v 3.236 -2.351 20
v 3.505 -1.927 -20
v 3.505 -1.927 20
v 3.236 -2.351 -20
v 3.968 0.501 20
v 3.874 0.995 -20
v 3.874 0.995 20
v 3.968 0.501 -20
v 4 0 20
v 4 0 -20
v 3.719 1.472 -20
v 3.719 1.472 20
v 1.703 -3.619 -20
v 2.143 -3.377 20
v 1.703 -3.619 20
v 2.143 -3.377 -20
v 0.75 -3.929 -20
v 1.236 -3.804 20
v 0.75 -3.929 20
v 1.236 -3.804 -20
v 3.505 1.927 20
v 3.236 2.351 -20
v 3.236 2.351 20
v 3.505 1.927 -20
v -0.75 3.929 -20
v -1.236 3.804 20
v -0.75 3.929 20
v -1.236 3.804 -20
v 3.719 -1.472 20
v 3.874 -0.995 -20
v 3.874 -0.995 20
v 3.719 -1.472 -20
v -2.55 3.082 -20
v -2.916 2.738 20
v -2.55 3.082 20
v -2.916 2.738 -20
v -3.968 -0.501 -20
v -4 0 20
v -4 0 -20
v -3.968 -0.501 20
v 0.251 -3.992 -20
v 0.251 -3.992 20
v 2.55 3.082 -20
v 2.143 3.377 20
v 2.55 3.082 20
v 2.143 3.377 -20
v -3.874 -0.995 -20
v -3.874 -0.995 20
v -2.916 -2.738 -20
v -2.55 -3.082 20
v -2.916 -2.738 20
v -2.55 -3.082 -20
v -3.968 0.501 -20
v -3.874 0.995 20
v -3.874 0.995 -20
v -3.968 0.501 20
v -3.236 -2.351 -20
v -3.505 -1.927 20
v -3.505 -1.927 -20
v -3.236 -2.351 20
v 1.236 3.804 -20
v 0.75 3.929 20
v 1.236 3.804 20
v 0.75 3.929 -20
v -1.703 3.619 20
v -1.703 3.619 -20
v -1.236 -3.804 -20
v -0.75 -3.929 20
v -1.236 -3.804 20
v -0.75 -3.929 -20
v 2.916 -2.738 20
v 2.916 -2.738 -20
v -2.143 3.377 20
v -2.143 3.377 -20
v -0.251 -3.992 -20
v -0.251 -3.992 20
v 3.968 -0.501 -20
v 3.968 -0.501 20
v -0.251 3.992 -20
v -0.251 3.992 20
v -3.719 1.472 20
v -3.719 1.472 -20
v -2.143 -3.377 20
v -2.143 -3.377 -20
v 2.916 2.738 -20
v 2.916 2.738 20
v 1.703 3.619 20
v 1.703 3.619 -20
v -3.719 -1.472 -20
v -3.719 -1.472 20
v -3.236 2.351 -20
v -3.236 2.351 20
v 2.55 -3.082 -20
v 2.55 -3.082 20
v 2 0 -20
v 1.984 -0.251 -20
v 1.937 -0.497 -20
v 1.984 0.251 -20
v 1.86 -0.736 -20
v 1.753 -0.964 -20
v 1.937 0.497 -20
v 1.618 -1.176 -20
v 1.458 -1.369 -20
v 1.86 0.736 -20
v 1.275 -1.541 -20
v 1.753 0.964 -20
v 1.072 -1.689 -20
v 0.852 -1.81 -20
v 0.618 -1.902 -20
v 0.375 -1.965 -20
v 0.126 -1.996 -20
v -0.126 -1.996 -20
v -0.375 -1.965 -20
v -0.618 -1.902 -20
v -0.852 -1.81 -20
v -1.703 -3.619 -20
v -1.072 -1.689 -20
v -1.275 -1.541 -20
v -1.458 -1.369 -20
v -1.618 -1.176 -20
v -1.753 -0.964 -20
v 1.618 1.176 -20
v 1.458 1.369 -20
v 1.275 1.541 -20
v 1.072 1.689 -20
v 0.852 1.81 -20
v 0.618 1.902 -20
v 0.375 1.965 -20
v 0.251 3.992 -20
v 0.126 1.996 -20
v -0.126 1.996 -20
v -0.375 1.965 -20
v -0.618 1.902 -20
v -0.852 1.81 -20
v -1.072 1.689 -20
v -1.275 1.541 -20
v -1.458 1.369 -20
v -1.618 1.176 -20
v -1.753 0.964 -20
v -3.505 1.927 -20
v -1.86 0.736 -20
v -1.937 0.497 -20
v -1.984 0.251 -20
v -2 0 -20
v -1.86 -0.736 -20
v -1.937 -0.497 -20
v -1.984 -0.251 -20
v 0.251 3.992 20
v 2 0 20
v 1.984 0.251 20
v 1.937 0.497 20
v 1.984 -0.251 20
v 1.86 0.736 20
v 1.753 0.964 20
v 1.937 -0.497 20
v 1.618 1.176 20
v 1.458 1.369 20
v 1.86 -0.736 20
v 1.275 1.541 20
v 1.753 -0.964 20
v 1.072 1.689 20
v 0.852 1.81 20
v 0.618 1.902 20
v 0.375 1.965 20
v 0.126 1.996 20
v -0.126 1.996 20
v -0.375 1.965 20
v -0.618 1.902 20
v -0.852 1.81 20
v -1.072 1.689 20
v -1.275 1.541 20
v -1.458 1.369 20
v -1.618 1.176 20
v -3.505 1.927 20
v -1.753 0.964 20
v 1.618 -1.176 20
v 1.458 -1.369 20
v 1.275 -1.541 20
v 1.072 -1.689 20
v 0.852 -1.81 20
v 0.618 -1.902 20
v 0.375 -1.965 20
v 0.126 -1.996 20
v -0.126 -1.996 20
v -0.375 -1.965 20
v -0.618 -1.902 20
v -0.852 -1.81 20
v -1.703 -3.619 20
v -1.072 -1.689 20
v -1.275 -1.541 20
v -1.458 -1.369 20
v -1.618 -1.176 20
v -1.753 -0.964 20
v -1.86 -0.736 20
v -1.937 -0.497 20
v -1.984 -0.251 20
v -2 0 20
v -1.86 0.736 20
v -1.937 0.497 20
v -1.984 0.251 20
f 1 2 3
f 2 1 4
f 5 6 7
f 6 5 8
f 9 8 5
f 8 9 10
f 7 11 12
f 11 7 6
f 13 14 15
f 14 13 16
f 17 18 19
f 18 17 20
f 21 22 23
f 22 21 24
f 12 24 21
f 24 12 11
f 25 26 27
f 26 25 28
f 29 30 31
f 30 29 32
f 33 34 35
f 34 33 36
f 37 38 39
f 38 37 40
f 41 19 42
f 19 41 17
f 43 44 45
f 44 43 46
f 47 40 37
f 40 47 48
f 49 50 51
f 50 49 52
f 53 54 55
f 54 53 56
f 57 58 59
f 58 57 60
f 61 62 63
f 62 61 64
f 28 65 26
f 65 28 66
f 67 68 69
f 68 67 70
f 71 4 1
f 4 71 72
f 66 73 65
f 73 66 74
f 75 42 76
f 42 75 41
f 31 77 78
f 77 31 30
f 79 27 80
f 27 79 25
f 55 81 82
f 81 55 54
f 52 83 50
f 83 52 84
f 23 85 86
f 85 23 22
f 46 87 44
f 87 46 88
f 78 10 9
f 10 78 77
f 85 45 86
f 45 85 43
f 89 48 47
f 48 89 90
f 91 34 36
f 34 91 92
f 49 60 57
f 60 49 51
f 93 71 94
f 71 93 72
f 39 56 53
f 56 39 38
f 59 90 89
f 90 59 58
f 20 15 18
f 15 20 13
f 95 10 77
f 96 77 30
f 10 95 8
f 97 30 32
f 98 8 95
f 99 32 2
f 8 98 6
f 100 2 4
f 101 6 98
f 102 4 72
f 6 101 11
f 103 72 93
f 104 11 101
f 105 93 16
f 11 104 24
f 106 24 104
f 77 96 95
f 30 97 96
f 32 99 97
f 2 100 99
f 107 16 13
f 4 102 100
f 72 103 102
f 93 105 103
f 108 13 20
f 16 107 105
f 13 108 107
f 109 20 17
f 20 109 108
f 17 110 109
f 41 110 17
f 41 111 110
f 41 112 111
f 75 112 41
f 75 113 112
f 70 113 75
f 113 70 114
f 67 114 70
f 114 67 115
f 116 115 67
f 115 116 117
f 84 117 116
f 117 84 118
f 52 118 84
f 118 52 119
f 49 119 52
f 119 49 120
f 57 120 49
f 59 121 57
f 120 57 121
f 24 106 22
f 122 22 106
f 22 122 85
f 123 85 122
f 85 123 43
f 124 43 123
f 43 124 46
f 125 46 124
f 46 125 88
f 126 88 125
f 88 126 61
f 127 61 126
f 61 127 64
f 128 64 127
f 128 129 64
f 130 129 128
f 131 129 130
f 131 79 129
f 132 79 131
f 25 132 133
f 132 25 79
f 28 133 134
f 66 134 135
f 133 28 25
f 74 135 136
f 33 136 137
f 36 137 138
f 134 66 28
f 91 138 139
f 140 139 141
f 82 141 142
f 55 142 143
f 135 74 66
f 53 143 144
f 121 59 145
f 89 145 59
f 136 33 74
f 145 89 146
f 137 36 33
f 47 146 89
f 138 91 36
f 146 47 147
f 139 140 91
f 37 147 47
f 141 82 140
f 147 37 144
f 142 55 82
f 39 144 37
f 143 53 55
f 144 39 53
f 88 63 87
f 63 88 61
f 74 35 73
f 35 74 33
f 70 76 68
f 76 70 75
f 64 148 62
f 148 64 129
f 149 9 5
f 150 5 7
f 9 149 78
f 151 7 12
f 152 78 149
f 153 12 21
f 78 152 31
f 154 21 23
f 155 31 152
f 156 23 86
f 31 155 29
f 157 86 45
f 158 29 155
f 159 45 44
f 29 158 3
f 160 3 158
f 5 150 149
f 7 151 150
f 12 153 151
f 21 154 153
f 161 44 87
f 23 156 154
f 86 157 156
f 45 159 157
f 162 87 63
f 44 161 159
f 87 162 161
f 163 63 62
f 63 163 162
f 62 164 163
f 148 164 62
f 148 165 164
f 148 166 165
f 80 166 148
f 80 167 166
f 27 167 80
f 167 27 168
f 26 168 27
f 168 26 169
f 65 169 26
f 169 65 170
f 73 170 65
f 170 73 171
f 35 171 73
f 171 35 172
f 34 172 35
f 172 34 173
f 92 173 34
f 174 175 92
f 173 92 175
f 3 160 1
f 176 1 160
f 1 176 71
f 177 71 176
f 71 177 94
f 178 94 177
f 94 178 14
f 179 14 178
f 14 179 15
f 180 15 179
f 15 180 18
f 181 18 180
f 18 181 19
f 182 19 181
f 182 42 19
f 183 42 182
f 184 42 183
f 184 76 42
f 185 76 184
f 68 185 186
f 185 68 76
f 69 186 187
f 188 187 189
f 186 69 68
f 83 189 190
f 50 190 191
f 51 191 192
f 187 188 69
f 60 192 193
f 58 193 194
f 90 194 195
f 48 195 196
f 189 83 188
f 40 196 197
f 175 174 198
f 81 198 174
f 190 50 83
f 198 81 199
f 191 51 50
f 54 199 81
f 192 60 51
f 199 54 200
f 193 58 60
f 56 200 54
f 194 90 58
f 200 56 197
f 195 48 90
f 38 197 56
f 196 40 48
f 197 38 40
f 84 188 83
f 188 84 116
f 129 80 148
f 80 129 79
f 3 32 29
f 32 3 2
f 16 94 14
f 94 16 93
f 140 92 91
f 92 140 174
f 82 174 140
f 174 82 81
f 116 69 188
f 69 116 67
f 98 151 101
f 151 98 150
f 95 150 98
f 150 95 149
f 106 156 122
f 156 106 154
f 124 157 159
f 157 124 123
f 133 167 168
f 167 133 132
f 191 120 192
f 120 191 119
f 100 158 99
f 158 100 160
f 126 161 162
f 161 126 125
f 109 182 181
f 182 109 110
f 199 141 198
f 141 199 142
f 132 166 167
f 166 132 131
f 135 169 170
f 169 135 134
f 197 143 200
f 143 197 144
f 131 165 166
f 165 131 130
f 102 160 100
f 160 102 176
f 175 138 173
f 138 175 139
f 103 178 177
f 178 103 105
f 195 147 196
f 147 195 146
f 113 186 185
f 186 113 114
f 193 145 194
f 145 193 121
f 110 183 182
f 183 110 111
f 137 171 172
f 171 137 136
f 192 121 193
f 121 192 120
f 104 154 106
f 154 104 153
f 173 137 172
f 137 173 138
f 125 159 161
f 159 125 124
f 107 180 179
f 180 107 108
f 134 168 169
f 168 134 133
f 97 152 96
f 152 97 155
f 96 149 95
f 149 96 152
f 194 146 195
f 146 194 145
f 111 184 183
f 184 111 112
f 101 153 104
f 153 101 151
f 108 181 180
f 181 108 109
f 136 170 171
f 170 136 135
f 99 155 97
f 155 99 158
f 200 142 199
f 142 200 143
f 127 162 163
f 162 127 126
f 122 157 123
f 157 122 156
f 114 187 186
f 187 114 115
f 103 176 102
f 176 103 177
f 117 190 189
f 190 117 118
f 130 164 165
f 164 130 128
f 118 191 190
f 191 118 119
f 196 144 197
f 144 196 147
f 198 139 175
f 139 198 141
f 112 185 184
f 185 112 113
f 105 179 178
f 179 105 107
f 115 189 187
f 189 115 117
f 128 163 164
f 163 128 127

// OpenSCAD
$fn = 50;


difference() {
	union() {
		translate(v = [0, 0, -20.0000000000]) {
			cylinder(h = 40, r = 4.0000000000);
		}
	}
	union() {
		translate(v = [0, 0, -100.0000000000]) {
			cylinder(h = 200, r = 2.0000000000);
		}
	}
}
